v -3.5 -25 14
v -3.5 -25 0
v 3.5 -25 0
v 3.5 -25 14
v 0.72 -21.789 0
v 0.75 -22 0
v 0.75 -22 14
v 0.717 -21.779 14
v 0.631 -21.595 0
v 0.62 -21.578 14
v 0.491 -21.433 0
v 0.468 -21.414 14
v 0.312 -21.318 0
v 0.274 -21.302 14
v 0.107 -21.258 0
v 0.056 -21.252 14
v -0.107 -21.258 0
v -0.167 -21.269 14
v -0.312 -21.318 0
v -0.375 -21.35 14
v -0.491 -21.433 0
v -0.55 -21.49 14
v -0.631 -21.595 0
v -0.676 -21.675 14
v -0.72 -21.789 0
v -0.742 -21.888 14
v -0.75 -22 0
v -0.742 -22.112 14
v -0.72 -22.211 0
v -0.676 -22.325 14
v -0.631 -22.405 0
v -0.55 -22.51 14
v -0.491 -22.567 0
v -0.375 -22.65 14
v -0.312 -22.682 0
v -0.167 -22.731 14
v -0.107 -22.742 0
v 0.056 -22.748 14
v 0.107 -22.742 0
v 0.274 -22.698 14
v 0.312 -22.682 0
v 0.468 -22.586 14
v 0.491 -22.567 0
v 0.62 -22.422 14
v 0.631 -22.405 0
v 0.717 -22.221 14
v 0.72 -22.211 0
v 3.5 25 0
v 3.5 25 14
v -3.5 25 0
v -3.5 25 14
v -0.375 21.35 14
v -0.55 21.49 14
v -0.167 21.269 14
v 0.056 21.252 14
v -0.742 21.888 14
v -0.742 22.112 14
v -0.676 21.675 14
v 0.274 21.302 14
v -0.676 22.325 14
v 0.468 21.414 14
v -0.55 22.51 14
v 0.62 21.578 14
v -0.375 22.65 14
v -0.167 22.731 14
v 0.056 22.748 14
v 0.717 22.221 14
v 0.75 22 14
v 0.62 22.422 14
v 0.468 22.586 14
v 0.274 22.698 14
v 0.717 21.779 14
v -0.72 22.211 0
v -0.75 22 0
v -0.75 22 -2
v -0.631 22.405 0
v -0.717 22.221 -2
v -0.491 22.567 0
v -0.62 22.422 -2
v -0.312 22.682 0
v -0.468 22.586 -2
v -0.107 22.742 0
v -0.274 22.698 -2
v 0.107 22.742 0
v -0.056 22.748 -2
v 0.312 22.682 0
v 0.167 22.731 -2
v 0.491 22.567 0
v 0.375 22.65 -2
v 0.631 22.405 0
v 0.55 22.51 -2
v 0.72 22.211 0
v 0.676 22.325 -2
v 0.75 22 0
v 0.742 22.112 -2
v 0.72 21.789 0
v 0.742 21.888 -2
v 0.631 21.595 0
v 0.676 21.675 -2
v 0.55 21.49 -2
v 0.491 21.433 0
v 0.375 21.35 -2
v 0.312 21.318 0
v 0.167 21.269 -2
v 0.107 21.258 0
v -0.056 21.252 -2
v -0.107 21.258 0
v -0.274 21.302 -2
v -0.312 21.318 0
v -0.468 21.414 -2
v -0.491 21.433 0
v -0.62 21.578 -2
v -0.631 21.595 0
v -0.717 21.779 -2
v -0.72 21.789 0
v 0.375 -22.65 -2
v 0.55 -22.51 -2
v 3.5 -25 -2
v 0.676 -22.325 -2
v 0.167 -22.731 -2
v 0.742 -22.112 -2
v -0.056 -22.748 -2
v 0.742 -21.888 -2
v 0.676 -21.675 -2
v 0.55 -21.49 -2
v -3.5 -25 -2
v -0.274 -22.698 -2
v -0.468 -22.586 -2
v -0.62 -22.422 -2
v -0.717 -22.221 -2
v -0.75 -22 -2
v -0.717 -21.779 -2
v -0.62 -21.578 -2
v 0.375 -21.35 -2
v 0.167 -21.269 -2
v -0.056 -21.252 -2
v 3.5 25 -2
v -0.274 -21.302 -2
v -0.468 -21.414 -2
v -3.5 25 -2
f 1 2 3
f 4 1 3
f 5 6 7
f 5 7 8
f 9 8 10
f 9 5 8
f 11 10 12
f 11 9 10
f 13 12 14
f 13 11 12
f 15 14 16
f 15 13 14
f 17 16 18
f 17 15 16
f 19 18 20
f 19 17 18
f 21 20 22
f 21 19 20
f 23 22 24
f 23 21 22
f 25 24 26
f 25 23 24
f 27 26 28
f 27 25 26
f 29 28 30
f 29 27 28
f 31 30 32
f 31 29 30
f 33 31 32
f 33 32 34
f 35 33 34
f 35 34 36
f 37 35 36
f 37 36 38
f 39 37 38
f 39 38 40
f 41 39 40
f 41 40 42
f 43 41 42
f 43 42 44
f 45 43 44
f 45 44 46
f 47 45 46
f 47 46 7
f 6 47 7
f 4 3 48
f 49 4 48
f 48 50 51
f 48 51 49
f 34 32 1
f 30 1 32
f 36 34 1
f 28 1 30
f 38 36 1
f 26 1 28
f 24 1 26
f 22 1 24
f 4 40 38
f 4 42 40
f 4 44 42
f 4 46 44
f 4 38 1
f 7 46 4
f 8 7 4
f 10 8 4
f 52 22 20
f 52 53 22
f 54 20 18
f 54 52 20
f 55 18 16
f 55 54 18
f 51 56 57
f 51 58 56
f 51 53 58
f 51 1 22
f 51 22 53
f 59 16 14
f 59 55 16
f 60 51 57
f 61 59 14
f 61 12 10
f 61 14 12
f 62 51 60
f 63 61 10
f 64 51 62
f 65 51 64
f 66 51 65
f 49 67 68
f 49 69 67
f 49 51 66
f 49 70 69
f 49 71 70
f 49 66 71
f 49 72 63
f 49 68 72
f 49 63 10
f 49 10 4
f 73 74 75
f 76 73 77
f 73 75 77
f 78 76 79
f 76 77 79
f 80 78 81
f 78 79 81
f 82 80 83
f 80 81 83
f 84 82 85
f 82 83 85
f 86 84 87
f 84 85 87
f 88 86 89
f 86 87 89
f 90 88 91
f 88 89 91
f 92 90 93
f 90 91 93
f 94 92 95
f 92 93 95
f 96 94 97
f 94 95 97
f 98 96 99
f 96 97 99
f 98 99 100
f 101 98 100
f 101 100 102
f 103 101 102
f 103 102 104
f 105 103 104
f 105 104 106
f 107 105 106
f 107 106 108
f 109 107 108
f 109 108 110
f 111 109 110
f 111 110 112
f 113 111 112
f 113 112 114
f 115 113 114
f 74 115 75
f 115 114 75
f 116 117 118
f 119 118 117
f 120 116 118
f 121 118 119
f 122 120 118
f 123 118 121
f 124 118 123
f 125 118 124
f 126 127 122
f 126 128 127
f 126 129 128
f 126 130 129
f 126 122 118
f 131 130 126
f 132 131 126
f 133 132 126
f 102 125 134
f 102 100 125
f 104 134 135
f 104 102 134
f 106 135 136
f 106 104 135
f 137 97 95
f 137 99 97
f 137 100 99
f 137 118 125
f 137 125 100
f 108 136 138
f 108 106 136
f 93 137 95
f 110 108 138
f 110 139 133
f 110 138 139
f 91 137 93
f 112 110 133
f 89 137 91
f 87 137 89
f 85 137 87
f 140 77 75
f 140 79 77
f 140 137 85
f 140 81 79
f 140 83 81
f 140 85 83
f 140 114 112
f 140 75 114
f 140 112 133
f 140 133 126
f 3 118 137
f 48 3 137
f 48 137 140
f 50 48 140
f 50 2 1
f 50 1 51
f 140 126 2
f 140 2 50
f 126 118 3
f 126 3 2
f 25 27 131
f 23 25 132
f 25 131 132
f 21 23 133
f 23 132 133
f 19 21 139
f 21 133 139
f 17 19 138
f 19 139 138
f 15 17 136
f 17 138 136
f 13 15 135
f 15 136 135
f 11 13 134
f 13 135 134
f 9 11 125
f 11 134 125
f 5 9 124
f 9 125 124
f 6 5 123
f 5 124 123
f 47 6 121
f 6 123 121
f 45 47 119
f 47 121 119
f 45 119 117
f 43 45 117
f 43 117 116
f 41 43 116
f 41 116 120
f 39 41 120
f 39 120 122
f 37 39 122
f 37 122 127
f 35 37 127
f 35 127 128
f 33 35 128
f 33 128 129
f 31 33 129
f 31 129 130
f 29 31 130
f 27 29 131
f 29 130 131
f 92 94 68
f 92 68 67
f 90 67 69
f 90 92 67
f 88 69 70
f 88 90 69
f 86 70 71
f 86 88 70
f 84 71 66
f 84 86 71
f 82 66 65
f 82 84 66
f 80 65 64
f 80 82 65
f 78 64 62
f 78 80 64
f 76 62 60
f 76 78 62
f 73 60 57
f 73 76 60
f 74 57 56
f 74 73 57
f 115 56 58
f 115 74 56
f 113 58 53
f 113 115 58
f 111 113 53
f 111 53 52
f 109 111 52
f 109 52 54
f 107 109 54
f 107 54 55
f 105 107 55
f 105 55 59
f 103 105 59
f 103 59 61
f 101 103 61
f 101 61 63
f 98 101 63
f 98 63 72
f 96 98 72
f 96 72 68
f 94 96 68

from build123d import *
from build123d.topology import SkipClean

# Parameters (mm, degrees)
SKETCH1_W           = 7
SKETCH1_H           = 50
SKETCH1_R           = 0.75
BOSS_EXTRUDE1_DEPTH = 14
BOSS_EXTRUDE2_START = 2
SKETCH3_W           = 7
SKETCH3_H           = 50
SKETCH3_R           = 0.75
BOSS_EXTRUDE2_DEPTH = 2


with BuildPart() as part:
    # Sketch1 → Boss-Extrude1 (new body)
    with BuildSketch(Plane.XY):
        Rectangle(SKETCH1_W, SKETCH1_H)
        with Locations((0, 22)):
            Circle(SKETCH1_R, mode=Mode.SUBTRACT)
        with Locations((0, -22)):
            Circle(SKETCH1_R, mode=Mode.SUBTRACT)
    extrude(amount=BOSS_EXTRUDE1_DEPTH)

    # Sketch3 → Boss-Extrude2 (add)
    with SkipClean():  # the faces are left unmerged after this step: merging them gives an invalid solid
        with BuildSketch(Plane(origin=(0, 0, 0), x_dir=(-1, 0, 0), z_dir=(0, 0, -1)).offset(BOSS_EXTRUDE2_START)):
            Rectangle(SKETCH3_W, SKETCH3_H)
            with Locations((0, 22)):
                Circle(SKETCH3_R, mode=Mode.SUBTRACT)
            with Locations((0, -22)):
                Circle(SKETCH3_R, mode=Mode.SUBTRACT)
        extrude(amount=-BOSS_EXTRUDE2_DEPTH)


solid = part.part
